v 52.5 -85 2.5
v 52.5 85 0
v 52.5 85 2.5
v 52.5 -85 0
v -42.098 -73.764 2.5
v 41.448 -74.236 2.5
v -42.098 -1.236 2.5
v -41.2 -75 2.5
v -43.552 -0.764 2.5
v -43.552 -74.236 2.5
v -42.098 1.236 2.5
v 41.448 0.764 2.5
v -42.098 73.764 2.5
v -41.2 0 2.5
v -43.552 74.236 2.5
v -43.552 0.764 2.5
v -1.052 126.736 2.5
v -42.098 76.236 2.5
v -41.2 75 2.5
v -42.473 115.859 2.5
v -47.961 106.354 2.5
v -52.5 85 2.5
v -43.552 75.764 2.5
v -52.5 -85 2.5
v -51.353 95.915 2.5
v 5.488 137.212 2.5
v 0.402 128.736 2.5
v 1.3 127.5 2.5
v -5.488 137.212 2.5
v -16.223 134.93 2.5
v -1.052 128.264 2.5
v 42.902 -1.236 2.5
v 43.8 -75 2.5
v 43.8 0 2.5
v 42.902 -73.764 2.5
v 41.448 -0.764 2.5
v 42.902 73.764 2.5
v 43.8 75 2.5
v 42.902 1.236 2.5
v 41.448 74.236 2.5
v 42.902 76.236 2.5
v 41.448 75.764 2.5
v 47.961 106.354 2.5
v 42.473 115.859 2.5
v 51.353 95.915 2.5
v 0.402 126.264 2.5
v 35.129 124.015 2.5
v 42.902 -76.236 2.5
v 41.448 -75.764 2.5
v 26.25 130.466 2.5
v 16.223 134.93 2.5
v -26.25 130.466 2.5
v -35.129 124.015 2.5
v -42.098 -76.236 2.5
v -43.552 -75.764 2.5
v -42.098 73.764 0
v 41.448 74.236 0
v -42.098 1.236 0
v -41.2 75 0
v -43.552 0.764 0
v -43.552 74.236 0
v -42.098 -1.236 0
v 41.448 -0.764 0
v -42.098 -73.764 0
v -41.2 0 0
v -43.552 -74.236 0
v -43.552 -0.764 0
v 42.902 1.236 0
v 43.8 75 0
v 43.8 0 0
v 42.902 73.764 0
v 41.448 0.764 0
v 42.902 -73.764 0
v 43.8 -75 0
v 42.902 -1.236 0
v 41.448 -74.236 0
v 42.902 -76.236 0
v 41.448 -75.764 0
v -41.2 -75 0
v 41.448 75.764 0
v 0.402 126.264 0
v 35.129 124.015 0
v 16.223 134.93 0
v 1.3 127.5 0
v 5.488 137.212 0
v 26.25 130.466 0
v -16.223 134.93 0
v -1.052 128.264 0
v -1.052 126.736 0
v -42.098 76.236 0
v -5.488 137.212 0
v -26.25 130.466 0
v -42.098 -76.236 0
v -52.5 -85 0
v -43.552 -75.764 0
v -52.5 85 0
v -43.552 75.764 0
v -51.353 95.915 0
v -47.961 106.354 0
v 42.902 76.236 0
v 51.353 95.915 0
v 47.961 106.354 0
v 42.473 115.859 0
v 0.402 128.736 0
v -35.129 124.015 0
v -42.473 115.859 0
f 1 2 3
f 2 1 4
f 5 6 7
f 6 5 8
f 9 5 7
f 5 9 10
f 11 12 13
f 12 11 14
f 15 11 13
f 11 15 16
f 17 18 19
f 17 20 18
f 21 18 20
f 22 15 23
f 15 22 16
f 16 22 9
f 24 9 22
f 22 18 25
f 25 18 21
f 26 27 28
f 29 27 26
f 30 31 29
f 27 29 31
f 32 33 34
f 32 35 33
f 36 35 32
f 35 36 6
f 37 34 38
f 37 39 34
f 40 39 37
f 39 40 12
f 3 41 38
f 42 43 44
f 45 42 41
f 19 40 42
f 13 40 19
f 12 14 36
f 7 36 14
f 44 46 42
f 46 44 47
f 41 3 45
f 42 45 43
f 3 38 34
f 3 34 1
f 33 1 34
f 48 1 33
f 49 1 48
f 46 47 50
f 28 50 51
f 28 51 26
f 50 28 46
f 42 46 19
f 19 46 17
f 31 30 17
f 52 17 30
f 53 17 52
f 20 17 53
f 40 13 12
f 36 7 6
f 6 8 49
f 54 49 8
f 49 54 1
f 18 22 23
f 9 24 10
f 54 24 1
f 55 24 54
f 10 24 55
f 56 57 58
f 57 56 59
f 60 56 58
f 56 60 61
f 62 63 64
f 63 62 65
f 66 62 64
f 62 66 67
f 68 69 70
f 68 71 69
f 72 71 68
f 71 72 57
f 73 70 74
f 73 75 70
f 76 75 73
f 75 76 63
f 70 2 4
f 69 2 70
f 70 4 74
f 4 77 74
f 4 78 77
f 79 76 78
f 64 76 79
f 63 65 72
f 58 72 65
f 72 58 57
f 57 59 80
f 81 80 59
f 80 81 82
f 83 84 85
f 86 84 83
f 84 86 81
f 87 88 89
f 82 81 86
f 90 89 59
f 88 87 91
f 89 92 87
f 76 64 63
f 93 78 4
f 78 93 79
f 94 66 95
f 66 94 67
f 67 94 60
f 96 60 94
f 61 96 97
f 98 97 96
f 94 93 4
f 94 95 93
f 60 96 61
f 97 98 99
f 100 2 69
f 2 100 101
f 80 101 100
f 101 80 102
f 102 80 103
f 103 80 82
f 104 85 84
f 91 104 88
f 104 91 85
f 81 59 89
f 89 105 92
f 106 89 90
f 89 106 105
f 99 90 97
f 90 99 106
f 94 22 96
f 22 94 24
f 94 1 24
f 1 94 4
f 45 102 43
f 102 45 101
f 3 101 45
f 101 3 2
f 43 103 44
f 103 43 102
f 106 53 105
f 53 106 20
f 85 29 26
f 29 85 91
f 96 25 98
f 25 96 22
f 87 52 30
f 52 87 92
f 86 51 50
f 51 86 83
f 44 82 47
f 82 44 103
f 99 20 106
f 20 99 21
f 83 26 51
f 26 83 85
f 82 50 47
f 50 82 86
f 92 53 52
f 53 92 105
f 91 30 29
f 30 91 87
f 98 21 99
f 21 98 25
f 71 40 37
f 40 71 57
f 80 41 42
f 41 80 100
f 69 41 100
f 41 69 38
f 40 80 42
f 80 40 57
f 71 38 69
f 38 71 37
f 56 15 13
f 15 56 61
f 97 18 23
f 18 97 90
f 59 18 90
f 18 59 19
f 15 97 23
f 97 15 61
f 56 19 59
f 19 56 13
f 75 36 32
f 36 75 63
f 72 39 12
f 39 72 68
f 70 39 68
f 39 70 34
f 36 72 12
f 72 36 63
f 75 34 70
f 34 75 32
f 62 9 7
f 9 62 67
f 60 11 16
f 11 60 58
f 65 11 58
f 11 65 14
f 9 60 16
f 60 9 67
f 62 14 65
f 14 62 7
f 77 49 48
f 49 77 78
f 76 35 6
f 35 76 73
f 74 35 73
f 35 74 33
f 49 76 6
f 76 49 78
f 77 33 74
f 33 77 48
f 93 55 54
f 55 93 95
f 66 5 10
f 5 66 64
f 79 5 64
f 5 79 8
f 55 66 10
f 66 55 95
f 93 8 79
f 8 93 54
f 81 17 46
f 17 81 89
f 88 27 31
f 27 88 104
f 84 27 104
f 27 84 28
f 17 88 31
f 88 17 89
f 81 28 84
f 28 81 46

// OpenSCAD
thickness=2.5;

module windowOutline(){
    eps = 0.01;
    union() {
        cube([60,92.5,thickness], center = true);
        translate([0, 20, 0]) {
          difference() {
            cylinder(h = thickness, r = 40, center = true);
            translate([-60-eps, 0, 0]) {
              cube([60,60,5], center = true);
            }
            translate([60+eps, 0, 0]) {
              cube([60,60,5], center = true);
            }  
          } 
        }
    }
}

module windowCutout(x,y)
{
    translate([x, y, 0]) {
        cube([16,32,10], center = true);
    }
}

module fastenerCutout(x,y)
{
    translate([x, y, 0]) {
        cylinder(h = 10, r = 1.3, center = true);
    }
}

module window(x,y)
{
    translate([x,y,0]){
        difference() {
            xShift = 12;
            yShift = 20;
            windowOutline();
            windowCutout(xShift, yShift);
            windowCutout(xShift,-yShift);
            windowCutout(-xShift,yShift);
            windowCutout(-xShift,-yShift);
            fastenerCutout(24, 41);
            fastenerCutout(24, -41);
            fastenerCutout(-24, 41);
            fastenerCutout(-24, -41);
        }
    }
}

doorWidth = 105;
doorRectangleHeight = 170;

module doorOutline()
{
    translate([0,0,thickness/2])
        cube([doorWidth,doorRectangleHeight,thickness], center = true);
    translate([0,doorRectangleHeight/2,thickness/2])
        cylinder(h = thickness, d = doorWidth, center = true);
}

module door() 
{
    setback = 10;
    difference() {
        doorOutline();
        fastenerCutout(doorWidth/2-setback, doorRectangleHeight/2 - setback);
        fastenerCutout(-(doorWidth/2-setback), doorRectangleHeight/2 - setback);
        fastenerCutout(doorWidth/2-setback, 0);
        fastenerCutout(-(doorWidth/2-setback), 0);
        fastenerCutout(doorWidth/2-setback, -(doorRectangleHeight/2 - setback));
        fastenerCutout(-(doorWidth/2-setback), -(doorRectangleHeight/2 - setback));
        fastenerCutout(0, doorRectangleHeight/2 + doorWidth/2 - setback);
    }
}

door();
